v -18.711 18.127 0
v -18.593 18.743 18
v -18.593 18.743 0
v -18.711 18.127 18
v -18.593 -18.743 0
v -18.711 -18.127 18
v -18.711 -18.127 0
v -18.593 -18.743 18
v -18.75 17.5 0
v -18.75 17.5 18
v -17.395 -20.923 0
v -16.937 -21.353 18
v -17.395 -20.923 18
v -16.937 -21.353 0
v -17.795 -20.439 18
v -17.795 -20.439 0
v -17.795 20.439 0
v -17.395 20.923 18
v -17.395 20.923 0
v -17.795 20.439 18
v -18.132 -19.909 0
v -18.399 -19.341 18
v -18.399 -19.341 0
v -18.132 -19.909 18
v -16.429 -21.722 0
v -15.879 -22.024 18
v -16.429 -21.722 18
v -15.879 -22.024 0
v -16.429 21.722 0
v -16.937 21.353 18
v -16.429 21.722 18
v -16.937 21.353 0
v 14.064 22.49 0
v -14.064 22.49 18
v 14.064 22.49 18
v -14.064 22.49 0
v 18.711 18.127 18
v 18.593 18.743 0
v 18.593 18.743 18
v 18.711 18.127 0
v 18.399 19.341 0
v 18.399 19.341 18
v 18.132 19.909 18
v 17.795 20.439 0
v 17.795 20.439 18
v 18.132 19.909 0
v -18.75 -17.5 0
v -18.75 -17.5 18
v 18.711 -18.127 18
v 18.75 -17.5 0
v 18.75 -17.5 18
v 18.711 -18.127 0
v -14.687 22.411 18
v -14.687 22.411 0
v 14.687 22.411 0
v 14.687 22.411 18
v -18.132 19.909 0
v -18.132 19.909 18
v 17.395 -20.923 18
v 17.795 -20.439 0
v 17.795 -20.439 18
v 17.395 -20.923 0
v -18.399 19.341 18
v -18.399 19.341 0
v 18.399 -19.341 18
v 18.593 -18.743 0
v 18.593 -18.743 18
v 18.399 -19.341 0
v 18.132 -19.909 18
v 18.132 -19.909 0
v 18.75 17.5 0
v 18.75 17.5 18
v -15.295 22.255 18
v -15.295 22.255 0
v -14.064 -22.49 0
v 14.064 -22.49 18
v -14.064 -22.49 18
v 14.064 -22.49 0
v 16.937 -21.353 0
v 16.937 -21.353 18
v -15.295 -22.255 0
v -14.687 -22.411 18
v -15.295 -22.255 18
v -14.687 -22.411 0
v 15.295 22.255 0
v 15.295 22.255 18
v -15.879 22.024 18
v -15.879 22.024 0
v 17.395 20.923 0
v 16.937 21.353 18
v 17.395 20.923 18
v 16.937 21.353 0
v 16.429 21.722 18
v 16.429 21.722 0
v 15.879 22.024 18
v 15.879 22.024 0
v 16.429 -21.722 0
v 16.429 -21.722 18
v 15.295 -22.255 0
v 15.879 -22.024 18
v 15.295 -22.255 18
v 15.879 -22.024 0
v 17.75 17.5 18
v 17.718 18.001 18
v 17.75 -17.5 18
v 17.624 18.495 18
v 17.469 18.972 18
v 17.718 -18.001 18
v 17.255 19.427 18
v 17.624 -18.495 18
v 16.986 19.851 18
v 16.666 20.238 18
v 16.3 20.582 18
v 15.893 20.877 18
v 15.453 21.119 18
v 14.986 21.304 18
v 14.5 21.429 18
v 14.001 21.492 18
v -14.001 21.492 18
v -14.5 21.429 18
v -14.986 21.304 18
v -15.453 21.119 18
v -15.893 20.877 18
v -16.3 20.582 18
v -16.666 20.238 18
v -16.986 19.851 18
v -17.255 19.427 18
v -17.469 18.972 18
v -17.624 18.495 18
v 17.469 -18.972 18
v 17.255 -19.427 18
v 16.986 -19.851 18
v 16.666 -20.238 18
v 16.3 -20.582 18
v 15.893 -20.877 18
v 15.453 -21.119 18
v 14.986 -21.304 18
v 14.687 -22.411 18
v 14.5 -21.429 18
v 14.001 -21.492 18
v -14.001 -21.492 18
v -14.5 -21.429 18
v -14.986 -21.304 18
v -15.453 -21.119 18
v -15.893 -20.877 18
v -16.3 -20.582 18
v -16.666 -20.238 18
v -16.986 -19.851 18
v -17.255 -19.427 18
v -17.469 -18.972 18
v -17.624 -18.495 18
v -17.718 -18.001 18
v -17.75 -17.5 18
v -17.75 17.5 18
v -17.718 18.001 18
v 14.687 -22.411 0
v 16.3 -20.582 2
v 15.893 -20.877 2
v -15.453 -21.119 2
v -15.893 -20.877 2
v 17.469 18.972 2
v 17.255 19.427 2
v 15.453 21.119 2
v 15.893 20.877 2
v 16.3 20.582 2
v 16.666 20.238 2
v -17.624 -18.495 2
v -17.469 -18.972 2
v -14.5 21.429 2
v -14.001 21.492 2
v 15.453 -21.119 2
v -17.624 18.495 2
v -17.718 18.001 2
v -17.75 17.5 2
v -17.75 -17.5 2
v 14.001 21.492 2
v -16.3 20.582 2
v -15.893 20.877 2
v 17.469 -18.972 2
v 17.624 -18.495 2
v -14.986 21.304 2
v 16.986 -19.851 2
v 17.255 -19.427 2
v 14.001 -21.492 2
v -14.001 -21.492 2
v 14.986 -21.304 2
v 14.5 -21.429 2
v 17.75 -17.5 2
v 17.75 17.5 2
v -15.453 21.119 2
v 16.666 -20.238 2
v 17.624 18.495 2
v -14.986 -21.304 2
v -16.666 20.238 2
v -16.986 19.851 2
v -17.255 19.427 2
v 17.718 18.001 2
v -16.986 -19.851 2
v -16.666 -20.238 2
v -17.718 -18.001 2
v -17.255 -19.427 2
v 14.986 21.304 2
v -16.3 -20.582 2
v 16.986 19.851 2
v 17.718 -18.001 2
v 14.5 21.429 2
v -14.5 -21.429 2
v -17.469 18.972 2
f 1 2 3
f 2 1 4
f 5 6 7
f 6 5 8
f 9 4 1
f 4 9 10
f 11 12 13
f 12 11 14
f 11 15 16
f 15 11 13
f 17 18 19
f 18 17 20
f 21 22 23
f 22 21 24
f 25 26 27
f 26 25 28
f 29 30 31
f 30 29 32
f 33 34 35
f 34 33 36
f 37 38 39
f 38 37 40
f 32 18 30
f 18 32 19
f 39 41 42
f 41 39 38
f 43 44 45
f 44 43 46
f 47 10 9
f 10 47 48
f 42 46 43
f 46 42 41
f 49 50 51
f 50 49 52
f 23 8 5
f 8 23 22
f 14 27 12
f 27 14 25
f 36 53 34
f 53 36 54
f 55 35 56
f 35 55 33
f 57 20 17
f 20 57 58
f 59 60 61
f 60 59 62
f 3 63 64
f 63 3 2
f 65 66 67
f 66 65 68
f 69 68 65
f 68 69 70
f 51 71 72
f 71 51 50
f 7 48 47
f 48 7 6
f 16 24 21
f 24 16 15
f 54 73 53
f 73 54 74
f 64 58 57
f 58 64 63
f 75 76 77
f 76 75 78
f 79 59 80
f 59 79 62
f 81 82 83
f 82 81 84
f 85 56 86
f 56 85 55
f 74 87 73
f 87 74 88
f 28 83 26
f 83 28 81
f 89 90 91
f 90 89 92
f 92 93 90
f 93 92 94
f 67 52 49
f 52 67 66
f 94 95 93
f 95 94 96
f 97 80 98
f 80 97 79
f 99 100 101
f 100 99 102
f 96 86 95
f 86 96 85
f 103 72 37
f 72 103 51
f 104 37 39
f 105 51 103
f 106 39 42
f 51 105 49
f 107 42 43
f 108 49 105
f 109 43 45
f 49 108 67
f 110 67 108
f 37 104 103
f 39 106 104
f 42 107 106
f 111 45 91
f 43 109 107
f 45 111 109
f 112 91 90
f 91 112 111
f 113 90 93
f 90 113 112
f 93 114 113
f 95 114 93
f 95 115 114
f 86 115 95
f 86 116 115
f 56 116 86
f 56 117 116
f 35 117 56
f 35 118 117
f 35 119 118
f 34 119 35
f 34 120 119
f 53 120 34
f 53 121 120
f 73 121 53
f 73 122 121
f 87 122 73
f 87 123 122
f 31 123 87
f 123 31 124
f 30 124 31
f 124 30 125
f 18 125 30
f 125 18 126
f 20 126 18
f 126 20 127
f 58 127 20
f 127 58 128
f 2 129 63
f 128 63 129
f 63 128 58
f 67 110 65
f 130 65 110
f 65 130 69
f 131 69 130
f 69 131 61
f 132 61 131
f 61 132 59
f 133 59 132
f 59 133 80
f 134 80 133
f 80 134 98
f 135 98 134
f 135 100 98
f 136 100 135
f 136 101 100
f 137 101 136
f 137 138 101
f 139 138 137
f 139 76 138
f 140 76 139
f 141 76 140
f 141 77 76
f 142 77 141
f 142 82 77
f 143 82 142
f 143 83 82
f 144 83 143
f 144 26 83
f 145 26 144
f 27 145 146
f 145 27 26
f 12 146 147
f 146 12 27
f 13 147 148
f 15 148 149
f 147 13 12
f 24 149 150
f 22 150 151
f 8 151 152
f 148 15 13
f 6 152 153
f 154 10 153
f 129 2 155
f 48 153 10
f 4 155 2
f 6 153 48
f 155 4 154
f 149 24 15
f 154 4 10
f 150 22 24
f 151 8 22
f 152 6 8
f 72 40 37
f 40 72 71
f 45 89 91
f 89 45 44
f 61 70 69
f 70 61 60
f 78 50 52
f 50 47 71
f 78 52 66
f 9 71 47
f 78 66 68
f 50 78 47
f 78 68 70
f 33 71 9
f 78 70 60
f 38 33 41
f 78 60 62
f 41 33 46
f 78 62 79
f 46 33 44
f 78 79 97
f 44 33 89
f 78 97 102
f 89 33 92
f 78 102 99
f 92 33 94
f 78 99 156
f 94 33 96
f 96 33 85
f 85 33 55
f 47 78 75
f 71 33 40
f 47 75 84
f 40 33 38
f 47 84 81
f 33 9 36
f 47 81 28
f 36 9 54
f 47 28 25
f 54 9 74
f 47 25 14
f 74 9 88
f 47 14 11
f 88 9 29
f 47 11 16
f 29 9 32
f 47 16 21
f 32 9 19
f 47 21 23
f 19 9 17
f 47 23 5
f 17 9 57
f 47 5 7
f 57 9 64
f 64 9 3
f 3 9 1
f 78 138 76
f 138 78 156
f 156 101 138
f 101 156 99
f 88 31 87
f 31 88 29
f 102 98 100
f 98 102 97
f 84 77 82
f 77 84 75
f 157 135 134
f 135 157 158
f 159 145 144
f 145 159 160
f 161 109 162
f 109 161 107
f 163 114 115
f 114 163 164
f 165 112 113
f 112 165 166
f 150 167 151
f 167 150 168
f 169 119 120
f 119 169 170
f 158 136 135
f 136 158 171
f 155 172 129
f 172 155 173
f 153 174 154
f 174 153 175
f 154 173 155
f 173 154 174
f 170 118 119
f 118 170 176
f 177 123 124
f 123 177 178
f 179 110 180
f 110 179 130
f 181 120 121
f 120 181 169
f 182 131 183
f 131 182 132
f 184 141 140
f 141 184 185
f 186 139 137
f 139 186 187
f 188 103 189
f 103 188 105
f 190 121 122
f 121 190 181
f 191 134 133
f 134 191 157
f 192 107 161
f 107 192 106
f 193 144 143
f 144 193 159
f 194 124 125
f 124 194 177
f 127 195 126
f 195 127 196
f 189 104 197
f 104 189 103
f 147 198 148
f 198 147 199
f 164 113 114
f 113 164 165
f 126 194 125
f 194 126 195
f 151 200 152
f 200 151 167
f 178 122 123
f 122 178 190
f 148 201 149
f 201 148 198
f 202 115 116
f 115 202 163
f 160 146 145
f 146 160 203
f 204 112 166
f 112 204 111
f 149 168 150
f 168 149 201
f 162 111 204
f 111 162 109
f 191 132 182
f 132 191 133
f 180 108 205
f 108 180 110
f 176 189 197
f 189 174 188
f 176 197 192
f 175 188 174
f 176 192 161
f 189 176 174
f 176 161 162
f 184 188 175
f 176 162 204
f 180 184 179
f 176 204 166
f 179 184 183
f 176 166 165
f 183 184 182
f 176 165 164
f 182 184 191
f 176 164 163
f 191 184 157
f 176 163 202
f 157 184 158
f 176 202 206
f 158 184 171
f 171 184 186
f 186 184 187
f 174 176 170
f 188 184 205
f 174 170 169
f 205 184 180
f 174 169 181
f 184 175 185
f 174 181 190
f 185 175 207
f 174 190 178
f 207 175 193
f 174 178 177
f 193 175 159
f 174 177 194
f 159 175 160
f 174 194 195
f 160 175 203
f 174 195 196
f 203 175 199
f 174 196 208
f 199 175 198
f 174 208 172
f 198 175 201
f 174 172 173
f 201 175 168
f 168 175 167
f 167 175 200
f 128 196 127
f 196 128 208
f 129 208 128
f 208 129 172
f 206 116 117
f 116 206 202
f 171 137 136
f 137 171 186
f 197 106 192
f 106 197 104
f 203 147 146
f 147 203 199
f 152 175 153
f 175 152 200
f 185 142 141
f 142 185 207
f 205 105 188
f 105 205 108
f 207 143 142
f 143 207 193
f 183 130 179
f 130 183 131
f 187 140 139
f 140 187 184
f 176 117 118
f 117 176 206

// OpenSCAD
$fn = 50;


difference() {
	union() {
		hull() {
			translate(v = [-13.7500000000, 17.5000000000, 0]) {
				cylinder(h = 18, r = 5);
			}
			translate(v = [13.7500000000, 17.5000000000, 0]) {
				cylinder(h = 18, r = 5);
			}
			translate(v = [-13.7500000000, -17.5000000000, 0]) {
				cylinder(h = 18, r = 5);
			}
			translate(v = [13.7500000000, -17.5000000000, 0]) {
				cylinder(h = 18, r = 5);
			}
		}
	}
	union() {
		translate(v = [0, 0, 2]) {
			hull() {
				translate(v = [-13.7500000000, 17.5000000000, 0]) {
					cylinder(h = 16, r = 4);
				}
				translate(v = [13.7500000000, 17.5000000000, 0]) {
					cylinder(h = 16, r = 4);
				}
				translate(v = [-13.7500000000, -17.5000000000, 0]) {
					cylinder(h = 16, r = 4);
				}
				translate(v = [13.7500000000, -17.5000000000, 0]) {
					cylinder(h = 16, r = 4);
				}
			}
		}
	}
}
